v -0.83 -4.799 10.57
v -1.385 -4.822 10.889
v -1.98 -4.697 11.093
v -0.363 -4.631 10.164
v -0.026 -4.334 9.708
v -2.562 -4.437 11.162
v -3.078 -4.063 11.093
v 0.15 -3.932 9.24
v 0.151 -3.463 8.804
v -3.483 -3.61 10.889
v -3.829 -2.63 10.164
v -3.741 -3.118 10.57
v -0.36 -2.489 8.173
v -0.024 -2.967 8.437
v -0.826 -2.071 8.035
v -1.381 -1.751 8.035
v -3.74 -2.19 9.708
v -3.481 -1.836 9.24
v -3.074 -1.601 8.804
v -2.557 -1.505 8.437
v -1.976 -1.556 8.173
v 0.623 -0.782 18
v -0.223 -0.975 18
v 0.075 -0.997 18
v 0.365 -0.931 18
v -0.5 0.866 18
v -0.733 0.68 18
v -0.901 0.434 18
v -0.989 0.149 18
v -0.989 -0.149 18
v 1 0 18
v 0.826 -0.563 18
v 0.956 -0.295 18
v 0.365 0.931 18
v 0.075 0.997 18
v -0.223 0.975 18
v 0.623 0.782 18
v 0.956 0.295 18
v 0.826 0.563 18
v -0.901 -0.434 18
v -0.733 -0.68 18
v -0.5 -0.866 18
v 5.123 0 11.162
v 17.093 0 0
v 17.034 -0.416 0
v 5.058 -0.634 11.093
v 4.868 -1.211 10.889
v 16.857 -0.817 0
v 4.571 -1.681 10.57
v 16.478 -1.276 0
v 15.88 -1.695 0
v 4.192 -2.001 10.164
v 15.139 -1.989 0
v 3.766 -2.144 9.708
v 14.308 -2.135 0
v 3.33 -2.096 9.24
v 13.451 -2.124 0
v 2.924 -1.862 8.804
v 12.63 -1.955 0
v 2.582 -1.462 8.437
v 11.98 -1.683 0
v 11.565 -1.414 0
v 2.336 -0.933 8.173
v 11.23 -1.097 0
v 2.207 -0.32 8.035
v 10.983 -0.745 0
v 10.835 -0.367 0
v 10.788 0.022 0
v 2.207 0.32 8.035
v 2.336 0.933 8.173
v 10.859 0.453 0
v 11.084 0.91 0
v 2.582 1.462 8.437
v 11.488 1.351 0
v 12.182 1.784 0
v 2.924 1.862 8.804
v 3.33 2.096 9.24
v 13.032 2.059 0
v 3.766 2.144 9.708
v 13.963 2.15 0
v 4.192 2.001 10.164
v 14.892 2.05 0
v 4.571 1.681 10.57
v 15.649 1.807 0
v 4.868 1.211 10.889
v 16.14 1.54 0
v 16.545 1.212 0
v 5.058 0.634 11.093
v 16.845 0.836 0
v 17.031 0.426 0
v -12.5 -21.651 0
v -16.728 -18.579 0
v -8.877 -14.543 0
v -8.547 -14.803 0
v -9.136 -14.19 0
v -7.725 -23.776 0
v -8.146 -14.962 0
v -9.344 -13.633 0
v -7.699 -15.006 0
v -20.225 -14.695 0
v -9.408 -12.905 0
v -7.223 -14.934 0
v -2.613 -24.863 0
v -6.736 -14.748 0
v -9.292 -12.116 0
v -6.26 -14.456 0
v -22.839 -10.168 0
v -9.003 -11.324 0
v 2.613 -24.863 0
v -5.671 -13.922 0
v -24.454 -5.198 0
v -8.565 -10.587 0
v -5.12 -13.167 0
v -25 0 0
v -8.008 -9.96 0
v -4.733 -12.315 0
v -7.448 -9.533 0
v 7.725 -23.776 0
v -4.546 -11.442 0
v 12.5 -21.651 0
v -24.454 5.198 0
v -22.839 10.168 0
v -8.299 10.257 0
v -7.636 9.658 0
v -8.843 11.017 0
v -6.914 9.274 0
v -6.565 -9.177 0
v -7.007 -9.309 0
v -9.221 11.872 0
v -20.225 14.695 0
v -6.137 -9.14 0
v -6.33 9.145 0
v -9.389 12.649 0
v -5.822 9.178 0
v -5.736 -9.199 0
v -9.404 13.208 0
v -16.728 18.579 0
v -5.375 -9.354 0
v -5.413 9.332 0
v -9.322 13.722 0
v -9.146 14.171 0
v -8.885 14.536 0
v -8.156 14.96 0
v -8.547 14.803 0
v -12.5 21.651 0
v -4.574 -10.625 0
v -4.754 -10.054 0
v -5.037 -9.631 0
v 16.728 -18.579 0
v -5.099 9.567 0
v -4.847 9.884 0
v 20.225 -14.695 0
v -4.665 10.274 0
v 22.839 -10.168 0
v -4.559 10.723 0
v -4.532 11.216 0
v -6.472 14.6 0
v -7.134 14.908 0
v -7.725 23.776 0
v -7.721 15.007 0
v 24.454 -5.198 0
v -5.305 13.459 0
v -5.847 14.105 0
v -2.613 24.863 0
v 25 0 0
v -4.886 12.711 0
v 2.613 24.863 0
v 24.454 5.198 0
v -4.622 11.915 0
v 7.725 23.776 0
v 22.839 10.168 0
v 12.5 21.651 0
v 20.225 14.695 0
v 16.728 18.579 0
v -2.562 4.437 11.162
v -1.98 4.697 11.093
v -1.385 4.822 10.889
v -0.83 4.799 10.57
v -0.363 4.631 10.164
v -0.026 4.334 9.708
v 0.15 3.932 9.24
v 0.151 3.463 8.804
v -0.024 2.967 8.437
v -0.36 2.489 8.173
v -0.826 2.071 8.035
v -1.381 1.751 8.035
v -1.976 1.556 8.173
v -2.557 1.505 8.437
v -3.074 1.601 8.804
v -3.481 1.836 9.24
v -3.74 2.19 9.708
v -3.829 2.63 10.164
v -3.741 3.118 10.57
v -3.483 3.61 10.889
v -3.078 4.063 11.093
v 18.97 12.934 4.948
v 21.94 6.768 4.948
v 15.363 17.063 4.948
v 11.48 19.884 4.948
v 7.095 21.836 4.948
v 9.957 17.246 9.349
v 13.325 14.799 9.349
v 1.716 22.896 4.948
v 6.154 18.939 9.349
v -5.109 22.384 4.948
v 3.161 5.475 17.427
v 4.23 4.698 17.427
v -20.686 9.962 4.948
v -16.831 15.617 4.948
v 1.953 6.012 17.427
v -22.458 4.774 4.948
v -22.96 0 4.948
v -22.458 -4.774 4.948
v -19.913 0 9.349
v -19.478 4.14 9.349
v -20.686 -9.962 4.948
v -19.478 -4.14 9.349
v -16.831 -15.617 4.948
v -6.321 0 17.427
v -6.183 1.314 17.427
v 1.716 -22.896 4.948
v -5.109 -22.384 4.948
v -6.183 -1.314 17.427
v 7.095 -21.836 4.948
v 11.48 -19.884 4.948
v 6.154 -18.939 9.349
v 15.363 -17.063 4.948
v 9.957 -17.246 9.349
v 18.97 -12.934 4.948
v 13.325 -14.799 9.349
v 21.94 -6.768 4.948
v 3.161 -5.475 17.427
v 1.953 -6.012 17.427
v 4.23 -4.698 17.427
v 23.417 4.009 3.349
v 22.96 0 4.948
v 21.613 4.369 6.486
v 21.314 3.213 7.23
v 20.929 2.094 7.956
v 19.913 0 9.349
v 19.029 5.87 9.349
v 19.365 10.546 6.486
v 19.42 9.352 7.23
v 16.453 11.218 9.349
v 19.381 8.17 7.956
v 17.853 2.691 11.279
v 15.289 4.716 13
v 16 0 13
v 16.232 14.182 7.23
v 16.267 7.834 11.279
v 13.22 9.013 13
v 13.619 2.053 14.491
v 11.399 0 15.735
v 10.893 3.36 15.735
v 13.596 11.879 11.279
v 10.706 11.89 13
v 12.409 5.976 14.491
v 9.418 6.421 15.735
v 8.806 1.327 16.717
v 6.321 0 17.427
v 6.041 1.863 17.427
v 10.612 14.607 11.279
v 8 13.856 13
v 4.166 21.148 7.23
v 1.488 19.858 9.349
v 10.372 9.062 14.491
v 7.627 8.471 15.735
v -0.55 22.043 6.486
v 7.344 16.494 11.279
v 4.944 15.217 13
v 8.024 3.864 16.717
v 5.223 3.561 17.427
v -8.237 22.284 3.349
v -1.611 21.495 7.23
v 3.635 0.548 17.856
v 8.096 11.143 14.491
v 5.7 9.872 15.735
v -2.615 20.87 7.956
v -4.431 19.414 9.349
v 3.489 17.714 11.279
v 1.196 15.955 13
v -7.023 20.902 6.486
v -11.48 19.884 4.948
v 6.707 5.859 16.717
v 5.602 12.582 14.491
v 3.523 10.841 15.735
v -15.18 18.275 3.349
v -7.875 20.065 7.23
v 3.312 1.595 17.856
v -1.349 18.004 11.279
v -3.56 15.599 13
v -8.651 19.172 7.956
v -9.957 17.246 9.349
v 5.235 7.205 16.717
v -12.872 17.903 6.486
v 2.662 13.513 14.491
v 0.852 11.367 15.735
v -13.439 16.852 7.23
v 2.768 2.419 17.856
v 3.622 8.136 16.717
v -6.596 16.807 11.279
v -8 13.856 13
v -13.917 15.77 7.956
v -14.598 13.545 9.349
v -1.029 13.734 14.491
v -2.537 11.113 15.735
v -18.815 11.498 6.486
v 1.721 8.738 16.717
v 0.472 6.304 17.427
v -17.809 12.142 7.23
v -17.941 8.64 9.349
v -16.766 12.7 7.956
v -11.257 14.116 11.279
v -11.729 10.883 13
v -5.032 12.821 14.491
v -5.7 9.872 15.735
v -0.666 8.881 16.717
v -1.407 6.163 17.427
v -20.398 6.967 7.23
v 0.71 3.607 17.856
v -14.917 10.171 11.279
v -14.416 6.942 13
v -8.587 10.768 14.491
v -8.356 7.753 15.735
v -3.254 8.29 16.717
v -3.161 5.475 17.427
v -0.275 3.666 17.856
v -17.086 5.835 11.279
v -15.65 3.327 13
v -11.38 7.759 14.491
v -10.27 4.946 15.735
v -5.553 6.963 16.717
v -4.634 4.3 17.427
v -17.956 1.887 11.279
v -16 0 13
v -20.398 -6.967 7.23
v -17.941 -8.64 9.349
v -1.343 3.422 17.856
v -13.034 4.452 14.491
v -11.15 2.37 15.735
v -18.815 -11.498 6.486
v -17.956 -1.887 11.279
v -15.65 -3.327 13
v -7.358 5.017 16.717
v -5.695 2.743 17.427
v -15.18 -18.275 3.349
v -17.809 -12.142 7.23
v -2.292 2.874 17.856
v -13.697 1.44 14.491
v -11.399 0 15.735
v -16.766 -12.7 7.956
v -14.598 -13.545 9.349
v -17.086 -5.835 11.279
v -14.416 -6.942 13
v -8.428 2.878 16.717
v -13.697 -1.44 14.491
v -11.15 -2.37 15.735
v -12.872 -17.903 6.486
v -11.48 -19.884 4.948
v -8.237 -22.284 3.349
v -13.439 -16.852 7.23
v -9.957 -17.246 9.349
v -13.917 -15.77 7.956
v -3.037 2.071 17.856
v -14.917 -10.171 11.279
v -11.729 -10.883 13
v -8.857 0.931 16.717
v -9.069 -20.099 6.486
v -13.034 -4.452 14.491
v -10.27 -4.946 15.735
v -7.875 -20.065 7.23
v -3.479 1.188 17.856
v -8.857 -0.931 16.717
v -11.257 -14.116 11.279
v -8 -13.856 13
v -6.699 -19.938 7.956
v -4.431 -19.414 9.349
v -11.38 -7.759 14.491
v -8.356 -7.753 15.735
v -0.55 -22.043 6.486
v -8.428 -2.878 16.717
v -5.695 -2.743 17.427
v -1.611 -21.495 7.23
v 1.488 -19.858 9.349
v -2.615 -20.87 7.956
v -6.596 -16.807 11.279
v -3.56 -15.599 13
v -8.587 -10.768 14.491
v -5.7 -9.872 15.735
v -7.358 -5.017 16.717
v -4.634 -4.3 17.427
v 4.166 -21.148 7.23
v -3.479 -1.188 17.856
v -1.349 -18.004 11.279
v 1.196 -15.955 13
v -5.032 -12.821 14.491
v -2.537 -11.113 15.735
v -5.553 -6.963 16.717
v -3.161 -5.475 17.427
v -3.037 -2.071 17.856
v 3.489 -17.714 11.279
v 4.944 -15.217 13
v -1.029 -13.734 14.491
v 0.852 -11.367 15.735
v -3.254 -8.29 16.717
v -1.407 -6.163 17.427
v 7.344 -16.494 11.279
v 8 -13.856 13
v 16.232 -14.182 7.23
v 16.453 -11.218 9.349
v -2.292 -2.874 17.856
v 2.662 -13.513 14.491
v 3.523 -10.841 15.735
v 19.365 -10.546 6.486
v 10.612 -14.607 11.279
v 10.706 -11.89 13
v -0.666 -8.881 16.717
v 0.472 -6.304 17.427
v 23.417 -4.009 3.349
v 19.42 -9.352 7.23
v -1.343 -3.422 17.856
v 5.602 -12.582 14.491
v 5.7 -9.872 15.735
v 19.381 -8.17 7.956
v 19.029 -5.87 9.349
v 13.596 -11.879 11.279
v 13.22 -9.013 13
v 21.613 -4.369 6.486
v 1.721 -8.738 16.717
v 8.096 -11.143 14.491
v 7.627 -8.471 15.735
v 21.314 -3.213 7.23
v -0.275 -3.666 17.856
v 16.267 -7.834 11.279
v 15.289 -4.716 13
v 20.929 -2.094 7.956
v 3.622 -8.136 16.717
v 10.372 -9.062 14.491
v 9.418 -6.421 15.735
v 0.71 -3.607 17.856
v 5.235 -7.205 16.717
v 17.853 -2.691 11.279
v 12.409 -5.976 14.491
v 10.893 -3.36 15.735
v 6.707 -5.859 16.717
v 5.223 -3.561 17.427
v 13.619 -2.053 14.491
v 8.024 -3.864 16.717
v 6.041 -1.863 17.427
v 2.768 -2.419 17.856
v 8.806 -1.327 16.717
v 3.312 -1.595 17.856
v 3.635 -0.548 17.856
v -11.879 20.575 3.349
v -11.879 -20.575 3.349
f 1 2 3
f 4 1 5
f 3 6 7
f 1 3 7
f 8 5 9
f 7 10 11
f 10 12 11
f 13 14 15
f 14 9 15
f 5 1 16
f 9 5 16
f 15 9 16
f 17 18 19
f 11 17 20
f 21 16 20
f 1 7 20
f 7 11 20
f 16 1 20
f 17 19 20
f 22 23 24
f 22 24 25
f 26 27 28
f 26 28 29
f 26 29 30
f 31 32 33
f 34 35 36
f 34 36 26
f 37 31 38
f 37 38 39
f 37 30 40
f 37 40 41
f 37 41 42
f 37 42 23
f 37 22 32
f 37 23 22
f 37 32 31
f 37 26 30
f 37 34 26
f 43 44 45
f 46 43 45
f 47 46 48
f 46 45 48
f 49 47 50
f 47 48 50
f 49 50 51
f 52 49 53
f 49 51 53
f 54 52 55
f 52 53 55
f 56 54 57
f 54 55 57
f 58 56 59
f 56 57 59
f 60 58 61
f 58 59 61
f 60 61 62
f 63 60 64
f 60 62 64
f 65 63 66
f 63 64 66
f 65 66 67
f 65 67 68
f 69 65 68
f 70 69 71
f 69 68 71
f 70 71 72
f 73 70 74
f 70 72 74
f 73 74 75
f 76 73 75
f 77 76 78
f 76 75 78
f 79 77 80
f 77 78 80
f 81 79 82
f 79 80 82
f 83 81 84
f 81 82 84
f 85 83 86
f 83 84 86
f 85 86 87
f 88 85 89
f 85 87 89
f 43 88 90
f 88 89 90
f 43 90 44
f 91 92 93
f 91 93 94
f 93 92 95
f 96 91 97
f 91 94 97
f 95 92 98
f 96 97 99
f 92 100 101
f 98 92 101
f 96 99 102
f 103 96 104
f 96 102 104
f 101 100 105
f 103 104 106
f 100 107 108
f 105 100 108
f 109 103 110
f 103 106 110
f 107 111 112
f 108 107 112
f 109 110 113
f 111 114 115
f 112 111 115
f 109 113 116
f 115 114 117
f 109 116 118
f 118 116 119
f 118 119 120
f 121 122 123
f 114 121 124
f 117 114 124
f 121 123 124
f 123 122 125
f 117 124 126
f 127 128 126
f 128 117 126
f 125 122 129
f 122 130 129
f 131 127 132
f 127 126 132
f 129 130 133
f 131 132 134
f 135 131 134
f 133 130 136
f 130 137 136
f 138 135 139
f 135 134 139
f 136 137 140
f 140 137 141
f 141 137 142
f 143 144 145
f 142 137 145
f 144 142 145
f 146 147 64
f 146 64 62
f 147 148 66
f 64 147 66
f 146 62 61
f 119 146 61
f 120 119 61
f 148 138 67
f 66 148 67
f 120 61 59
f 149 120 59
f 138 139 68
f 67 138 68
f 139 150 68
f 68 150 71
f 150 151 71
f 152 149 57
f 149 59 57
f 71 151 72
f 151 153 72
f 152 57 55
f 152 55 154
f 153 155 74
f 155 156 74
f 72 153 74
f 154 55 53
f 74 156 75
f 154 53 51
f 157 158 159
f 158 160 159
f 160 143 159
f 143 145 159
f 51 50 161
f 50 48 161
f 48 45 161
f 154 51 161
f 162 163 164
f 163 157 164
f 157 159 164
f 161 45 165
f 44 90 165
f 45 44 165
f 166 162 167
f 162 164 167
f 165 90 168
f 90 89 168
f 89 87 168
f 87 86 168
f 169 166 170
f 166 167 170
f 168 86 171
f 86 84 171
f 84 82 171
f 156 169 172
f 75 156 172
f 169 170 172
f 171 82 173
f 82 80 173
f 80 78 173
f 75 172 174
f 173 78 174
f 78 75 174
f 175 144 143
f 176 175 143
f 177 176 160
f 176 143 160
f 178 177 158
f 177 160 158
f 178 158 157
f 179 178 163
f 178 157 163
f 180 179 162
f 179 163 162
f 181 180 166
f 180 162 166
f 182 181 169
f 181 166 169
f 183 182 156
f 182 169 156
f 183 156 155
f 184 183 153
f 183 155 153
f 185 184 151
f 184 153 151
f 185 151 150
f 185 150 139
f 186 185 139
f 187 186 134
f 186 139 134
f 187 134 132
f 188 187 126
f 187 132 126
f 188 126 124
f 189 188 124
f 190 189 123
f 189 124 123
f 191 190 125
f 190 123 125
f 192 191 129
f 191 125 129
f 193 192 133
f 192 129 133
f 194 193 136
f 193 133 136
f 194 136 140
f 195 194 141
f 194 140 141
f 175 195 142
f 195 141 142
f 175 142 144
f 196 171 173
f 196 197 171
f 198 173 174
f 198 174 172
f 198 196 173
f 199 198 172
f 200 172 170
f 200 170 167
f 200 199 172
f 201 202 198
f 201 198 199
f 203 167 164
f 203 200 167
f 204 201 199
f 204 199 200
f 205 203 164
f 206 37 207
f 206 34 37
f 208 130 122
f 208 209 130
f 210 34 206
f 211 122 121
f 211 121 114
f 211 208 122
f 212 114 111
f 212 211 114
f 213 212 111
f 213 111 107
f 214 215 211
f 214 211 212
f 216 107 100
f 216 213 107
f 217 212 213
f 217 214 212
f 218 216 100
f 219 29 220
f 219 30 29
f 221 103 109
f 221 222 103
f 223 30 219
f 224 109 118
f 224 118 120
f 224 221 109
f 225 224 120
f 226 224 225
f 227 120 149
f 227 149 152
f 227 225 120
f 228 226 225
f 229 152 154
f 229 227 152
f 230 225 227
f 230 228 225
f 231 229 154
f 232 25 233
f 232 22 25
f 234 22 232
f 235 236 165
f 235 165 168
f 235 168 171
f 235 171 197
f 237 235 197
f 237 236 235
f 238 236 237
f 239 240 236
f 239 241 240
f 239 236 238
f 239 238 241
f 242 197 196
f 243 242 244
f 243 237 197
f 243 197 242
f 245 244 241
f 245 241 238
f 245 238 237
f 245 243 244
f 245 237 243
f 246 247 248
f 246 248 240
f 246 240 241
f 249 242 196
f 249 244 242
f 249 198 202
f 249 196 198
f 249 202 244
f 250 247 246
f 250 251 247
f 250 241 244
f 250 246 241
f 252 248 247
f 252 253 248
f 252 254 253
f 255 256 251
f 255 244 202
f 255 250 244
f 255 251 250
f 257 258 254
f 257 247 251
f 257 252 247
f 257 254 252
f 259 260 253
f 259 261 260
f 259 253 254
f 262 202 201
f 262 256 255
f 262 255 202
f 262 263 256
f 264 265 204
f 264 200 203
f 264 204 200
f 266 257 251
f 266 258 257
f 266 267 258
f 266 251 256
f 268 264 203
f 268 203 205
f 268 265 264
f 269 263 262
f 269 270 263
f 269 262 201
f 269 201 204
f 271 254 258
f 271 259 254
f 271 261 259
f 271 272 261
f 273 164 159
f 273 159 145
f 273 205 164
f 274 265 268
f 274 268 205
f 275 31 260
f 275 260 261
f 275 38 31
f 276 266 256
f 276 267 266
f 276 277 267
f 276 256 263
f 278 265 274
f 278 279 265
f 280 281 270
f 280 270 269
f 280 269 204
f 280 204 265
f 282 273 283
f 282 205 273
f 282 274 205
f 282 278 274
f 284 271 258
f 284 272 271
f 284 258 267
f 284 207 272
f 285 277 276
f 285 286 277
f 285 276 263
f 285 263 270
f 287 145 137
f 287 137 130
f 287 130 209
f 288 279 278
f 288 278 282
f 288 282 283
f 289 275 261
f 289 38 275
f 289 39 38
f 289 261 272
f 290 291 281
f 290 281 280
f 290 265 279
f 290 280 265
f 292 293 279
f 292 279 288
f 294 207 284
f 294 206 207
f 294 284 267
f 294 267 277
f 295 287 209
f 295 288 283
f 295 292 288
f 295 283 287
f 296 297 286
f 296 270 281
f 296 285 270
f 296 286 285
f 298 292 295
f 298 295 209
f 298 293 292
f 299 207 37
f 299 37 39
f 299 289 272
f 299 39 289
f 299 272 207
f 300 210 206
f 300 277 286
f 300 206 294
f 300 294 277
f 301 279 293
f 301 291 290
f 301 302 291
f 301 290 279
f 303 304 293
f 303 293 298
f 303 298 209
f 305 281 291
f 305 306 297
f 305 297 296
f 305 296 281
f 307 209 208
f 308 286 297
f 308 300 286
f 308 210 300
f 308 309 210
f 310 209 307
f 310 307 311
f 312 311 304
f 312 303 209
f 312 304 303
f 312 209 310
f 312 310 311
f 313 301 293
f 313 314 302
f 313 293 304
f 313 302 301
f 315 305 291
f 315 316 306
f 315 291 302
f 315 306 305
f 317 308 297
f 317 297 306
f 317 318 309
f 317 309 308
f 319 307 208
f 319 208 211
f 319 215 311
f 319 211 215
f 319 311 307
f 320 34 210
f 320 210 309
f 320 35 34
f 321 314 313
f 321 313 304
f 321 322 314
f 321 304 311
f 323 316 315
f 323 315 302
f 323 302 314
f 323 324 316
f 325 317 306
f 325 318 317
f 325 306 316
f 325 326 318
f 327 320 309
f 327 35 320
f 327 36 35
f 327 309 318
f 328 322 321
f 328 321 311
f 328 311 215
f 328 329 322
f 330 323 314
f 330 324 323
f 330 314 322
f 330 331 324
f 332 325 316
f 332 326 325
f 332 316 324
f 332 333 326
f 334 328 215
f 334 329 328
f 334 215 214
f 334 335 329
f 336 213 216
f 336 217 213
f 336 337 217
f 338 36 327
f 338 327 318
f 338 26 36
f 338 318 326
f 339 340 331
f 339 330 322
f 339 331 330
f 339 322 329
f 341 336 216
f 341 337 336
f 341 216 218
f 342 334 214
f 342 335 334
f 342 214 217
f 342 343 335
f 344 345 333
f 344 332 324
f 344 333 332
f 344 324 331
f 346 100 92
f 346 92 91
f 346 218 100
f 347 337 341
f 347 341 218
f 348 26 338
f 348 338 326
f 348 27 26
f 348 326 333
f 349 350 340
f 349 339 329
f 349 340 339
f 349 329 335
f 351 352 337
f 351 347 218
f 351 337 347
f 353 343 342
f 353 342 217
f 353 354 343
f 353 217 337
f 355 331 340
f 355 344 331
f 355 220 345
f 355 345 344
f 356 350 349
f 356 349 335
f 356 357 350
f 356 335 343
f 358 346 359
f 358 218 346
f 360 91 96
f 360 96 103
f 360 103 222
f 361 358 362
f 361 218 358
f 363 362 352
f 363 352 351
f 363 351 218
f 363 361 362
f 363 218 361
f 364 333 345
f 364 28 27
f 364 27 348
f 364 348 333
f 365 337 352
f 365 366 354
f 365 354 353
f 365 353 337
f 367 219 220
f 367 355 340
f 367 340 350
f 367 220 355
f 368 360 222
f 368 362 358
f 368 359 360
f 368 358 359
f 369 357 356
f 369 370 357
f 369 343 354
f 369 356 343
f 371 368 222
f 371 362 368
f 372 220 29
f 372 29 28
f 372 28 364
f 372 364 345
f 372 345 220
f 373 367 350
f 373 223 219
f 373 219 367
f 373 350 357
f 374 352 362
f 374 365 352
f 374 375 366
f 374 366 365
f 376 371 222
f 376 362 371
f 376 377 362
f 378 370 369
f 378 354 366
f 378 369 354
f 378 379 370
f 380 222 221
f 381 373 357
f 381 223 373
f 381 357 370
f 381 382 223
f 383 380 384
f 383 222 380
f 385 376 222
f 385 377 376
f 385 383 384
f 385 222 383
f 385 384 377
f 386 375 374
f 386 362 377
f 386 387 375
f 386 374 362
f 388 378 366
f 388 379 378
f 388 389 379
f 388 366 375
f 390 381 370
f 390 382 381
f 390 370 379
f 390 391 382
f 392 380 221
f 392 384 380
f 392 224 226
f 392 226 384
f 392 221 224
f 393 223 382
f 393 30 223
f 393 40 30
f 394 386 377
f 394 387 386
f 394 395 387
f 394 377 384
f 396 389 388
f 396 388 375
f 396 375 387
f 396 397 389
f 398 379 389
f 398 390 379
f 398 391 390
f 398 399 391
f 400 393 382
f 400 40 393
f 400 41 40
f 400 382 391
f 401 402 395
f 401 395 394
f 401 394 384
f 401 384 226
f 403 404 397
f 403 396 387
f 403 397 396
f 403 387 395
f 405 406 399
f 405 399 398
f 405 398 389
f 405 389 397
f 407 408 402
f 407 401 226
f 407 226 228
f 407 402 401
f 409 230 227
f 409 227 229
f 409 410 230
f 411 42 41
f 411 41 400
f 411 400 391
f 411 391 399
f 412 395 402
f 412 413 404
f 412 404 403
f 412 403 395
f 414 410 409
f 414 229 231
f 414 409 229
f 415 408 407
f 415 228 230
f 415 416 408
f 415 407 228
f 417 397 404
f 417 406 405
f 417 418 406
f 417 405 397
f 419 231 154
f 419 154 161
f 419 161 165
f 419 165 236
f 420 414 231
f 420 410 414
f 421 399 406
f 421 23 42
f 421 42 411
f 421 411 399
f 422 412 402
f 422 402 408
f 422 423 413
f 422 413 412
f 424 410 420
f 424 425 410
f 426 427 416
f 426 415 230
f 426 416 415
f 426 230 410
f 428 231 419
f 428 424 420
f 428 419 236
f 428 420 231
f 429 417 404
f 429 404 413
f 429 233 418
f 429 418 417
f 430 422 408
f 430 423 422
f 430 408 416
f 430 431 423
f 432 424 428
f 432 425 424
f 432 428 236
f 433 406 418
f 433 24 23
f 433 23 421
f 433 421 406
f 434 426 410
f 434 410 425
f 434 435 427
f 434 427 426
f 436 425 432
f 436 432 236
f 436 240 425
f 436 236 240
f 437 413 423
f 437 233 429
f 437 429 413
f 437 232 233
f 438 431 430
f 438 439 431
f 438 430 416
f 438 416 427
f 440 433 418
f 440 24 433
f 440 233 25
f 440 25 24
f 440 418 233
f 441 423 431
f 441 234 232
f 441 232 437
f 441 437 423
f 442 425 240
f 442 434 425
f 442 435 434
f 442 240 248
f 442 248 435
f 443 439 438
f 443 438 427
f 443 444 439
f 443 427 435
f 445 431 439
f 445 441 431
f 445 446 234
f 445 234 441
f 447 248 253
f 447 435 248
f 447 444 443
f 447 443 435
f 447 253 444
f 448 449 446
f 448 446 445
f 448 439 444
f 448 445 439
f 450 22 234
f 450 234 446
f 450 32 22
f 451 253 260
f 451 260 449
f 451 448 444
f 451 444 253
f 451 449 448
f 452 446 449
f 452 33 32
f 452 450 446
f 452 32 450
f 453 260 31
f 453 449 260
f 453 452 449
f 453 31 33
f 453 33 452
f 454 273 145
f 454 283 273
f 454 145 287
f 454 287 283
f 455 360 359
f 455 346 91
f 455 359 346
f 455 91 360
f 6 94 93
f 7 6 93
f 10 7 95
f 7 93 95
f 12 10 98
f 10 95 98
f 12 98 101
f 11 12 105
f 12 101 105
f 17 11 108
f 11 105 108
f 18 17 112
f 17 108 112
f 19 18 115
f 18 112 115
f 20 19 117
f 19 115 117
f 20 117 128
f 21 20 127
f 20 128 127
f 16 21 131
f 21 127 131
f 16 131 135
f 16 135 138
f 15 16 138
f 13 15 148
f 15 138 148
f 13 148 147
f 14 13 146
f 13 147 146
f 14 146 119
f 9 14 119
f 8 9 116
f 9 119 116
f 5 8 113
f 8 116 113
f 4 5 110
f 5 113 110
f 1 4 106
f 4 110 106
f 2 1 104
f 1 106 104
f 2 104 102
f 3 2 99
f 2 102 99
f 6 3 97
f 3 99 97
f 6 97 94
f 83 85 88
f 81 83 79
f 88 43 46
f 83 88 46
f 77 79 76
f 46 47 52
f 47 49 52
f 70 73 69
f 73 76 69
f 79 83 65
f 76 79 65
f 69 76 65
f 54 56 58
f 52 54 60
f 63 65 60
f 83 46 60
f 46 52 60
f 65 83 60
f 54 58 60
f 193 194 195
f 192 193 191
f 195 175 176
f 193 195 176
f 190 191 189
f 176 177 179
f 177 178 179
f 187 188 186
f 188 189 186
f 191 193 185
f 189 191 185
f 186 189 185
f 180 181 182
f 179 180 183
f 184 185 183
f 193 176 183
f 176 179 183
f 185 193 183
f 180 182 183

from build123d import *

# Parameters (mm, degrees)
ESQUISSE1_R                  = 25
BOSS_EXTRU_1_DEPTH           = 18
CONG_1_R                     = 25
R_P_TITION_CIRCULAIRE1_COUNT = 3


with BuildPart() as part:
    # Esquisse1 → Boss.-Extru.1 (new body)
    with BuildSketch(Plane.XY):
        Circle(ESQUISSE1_R)
    extrude(amount=BOSS_EXTRU_1_DEPTH)

    # Congé1
    # the kernel refuses this fillet: 25 mm, written as the material it takes off along each edge
    with BuildSketch(Plane(origin=(0, 0, 18), x_dir=(1, 0, 0), z_dir=(0, -1, 0))) as cong_1_piece_1:
        with BuildLine():
            CenterArc((1, -25), CONG_1_R, 16.260204708, 73.739795292)
            Line((1, 0), (1, 0.5))
            Line((1, 0.5), (25, 0.5))
            Line((25, 0.5), (25.5, 0))
            ThreePointArc((25.5, 0), (25.5, -9), (25.48, -17.86))
            Line((25.48, -17.86), (25, -18))
        make_face()
    revolve(axis=Axis((0, 0, 18), (0, 0, 1)), mode=Mode.SUBTRACT)

    # Esquisse3 → Enlèvement de matière-Révolution1 (revolve, cut)
    with BuildSketch(Plane(origin=(0, 0, 0), x_dir=(1, 0, 0), z_dir=(0, 1, 0))):
        Polygon((16.821135137, 2.685962281), (3.656768508, -9.5900082), (5.123064982, -11.162418658), (18.287431611, 1.113551823), align=None)
    enl_vement_de_mati_re_r_volution1 = revolve(axis=Axis((0, 0, 13), (0.7313537016191742, 0, -0.6819983600624946)), mode=Mode.SUBTRACT)

    # Répétition circulaire1: Enlèvement de matière-Révolution1 ×3 about axis
    r_p_tition_circulaire1_axis = Axis((0, 0, 0), (0, 0, 1))
    for i in range(1, R_P_TITION_CIRCULAIRE1_COUNT):
        add(enl_vement_de_mati_re_r_volution1.rotate(r_p_tition_circulaire1_axis, i * 360 / R_P_TITION_CIRCULAIRE1_COUNT), mode=Mode.SUBTRACT)


solid = part.part
